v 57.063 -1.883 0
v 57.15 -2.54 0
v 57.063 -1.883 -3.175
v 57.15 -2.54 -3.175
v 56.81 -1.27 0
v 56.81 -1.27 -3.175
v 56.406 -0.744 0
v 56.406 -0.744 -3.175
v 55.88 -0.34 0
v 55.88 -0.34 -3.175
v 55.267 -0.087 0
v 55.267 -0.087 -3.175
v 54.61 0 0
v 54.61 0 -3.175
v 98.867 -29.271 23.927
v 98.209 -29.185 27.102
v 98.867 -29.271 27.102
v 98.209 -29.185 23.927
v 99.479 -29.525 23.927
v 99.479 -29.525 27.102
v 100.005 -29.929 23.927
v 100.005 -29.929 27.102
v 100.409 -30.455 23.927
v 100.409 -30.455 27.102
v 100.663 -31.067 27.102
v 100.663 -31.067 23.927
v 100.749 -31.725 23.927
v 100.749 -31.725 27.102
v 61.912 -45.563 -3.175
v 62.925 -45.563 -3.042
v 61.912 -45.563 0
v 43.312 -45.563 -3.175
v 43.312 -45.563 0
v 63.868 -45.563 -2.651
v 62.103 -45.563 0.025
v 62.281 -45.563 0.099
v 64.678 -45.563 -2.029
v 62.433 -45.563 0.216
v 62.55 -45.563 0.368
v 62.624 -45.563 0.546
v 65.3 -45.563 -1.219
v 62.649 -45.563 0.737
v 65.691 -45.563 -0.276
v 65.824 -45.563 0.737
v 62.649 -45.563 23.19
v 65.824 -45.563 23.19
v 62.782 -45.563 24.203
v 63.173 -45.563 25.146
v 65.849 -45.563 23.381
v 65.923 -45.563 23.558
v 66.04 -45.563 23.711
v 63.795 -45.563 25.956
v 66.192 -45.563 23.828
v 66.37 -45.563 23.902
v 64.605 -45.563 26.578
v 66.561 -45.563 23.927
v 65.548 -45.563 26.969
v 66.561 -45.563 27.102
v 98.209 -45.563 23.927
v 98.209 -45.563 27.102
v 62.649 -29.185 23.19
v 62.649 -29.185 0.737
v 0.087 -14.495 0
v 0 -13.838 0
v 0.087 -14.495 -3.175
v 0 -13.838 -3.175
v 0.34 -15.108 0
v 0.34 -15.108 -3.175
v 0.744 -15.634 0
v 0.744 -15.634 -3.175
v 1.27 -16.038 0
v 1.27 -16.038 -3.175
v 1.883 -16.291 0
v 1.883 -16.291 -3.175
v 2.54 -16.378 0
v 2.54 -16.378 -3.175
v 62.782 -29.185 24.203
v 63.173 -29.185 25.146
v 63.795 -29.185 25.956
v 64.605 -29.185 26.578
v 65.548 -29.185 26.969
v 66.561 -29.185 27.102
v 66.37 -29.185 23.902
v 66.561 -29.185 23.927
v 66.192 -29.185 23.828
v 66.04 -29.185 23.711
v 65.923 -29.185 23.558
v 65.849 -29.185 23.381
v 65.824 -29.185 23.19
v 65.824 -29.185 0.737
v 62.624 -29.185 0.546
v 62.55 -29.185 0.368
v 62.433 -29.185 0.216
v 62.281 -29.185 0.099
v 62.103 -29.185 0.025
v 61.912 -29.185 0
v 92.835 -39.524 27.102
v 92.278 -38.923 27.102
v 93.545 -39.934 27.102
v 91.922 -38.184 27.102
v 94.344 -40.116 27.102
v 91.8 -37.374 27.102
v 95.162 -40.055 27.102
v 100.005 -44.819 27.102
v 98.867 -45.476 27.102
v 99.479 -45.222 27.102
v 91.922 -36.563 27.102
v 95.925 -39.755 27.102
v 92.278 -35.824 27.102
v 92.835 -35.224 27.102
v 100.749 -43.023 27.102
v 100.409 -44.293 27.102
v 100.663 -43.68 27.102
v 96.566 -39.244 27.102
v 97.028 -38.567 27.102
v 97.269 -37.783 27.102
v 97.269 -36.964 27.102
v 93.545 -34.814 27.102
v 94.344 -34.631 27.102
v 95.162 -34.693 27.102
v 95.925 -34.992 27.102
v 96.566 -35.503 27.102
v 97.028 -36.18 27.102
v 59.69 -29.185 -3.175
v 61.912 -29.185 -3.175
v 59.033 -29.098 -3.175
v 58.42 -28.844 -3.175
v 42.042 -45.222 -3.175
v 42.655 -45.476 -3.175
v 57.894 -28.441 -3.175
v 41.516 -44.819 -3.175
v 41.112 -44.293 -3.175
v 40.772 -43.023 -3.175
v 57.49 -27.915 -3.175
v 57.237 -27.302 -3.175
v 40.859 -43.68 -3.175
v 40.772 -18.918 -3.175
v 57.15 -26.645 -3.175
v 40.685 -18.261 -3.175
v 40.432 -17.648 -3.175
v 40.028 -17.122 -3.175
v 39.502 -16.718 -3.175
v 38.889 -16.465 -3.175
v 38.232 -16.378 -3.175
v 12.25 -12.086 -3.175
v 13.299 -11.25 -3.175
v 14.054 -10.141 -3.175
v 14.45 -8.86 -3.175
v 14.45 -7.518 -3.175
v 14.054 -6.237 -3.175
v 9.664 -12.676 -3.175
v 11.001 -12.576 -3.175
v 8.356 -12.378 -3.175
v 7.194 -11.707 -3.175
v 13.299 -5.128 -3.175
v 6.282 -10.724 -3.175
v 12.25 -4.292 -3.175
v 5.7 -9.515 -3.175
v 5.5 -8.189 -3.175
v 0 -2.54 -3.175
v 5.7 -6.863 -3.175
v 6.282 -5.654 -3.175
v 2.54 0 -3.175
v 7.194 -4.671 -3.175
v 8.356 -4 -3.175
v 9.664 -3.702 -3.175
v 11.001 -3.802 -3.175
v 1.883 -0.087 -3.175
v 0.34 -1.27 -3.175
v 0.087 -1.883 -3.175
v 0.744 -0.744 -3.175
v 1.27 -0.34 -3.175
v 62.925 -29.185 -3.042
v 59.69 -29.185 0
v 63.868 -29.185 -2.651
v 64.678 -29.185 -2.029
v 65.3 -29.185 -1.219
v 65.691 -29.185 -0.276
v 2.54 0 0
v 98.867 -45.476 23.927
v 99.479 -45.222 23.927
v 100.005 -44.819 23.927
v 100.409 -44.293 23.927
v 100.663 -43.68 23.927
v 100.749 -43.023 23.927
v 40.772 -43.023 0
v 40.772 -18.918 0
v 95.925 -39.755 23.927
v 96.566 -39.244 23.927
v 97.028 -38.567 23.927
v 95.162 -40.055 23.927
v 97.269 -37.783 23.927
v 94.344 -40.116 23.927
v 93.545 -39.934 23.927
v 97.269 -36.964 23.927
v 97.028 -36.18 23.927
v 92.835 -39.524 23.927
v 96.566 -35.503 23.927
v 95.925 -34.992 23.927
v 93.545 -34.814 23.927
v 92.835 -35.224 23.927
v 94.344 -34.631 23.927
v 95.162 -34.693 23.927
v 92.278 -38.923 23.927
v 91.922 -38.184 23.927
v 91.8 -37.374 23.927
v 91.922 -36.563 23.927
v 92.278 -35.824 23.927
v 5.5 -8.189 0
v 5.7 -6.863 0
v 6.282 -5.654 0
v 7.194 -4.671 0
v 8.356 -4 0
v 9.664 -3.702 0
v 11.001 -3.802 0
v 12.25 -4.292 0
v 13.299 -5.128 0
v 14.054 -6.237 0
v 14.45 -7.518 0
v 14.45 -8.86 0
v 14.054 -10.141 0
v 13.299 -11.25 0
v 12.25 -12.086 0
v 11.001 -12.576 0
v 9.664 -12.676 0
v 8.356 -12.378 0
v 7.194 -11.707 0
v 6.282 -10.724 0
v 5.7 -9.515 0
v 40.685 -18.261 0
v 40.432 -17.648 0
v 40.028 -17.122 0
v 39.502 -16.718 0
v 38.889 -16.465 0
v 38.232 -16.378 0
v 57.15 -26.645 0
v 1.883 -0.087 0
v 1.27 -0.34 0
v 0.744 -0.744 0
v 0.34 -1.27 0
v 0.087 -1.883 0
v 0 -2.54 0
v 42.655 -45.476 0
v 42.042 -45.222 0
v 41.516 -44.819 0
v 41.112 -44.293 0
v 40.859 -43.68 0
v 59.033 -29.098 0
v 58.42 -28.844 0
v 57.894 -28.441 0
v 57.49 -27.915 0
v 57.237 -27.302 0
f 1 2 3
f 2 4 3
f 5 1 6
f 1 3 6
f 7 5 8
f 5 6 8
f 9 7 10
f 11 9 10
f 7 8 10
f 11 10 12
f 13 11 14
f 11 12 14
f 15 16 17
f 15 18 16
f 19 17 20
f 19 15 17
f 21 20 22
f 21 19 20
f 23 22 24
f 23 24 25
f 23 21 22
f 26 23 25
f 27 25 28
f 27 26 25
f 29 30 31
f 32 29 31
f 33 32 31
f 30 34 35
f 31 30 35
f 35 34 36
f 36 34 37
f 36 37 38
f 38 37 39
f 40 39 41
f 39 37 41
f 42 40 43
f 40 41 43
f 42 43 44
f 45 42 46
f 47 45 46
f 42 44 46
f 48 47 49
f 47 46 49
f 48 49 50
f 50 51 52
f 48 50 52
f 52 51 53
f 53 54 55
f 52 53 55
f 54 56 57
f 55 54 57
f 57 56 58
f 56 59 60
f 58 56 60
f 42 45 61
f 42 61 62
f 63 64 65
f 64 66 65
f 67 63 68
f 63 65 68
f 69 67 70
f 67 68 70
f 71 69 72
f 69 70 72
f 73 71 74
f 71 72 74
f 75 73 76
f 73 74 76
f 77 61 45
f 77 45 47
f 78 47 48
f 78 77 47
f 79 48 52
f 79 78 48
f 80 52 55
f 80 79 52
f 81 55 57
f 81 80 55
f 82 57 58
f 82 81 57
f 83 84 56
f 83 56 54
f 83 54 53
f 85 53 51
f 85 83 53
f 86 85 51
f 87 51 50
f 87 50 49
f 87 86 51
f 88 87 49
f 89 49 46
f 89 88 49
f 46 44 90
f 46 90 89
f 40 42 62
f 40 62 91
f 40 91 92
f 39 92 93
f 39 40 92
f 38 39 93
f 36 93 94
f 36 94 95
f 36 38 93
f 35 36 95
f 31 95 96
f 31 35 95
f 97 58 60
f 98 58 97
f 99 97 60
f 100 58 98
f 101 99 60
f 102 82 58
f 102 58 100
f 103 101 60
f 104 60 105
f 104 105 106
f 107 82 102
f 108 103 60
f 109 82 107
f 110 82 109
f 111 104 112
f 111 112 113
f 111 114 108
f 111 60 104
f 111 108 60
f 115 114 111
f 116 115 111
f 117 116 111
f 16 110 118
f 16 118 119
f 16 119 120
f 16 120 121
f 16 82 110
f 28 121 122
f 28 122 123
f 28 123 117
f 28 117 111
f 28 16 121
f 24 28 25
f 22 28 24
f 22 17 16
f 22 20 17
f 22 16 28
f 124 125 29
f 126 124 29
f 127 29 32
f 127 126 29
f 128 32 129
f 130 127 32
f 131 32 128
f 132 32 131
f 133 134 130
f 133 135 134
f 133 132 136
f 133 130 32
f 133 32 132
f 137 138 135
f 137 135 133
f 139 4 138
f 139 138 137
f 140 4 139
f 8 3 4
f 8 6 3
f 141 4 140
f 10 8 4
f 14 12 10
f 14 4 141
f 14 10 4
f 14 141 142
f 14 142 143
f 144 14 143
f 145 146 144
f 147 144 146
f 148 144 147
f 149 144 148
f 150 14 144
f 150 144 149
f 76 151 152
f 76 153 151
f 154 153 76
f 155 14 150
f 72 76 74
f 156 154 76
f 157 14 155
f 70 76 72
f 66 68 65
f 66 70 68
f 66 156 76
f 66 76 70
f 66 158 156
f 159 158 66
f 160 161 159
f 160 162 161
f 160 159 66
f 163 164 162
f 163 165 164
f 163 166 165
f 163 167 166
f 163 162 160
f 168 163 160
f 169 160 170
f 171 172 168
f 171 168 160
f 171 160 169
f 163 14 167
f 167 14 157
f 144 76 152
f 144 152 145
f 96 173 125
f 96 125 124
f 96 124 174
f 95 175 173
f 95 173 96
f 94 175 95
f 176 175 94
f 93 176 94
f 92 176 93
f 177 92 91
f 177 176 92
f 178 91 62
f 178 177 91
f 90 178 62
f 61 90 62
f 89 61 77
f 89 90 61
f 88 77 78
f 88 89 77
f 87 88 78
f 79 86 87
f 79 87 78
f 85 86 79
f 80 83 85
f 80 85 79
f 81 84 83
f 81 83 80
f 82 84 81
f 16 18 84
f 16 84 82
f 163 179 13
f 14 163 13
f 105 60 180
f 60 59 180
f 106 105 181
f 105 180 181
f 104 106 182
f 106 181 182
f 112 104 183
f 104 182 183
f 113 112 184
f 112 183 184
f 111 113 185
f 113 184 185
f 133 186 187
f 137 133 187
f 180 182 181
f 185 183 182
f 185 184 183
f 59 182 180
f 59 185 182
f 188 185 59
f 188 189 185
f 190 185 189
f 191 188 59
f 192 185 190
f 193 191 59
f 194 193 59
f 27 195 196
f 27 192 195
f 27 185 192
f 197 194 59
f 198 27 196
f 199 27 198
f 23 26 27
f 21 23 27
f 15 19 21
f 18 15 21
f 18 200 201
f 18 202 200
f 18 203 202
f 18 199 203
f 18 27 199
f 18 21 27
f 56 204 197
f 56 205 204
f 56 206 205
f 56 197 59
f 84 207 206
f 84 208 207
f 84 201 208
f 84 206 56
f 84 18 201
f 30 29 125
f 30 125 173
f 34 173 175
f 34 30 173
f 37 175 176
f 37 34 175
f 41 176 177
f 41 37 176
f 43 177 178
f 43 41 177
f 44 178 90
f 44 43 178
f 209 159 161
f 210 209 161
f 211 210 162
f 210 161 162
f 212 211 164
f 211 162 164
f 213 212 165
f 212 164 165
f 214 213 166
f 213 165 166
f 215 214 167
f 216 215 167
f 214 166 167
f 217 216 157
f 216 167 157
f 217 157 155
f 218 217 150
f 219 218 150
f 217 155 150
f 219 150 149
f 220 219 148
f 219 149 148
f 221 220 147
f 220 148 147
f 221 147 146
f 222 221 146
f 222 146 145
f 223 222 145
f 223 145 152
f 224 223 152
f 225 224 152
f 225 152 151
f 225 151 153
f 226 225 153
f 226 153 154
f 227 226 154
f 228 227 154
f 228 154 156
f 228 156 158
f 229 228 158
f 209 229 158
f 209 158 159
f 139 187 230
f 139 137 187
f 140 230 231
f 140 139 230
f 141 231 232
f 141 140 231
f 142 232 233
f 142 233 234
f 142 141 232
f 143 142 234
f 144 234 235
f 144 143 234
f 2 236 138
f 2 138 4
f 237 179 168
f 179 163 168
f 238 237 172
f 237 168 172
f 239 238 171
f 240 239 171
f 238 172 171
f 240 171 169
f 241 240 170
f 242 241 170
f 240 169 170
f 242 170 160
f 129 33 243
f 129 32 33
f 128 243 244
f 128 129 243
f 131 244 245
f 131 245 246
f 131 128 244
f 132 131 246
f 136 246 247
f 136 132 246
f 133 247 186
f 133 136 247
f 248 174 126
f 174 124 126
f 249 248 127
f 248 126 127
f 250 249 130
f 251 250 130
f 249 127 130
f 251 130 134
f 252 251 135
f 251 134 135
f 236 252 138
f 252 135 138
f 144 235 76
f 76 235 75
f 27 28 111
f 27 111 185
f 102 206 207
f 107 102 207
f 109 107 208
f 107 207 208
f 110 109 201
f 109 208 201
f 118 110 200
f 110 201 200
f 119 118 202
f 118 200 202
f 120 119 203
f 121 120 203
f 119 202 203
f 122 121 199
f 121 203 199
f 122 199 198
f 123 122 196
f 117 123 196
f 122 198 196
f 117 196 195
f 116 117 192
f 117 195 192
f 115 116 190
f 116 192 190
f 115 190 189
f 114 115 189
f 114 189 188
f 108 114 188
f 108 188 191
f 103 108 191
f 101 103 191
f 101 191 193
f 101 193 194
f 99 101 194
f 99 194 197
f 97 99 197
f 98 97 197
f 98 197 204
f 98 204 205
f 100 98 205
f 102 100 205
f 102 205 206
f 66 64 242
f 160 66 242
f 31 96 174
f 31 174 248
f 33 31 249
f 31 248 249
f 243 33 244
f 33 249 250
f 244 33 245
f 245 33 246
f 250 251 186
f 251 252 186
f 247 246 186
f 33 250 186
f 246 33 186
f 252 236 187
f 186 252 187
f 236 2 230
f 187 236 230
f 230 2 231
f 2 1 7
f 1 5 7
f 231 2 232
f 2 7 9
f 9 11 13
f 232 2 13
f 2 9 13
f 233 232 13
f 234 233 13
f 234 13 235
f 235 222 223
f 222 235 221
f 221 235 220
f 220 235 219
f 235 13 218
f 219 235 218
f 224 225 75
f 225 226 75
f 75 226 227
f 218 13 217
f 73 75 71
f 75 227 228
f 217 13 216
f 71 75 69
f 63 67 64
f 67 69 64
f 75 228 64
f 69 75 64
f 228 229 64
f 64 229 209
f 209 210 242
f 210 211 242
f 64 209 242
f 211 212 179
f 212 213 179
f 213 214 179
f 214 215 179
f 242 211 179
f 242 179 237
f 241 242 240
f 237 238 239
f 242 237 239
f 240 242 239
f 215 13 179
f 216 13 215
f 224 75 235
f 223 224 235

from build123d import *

# Parameters (mm, degrees)
BASE_FLANGE1_DEPTH           = 3.175
M8_CLEARANCE_HOLE1_D         = 9
EDGE_FLANGE1_DEPTH           = 16.378
EDGE_FLANGE2_STRIP_W         = 14.1732
EDGE_FLANGE2_STRIP_H         = 3.175
EDGE_FLANGE2_STRIP_CUT_DEPTH = 16.378
EDGE_FLANGE2_DEPTH           = 16.378
M5_CLEARANCE_HOLE1_D         = 5.5
FILLET1_R                    = 2.54


# Sheet-metal steps are written as plain solids
with BuildPart() as part:
    # Sketch1 → Base-Flange1 (new body)
    with BuildSketch(Plane.XY):
        Polygon((0, 0), (57.15, 0), (57.15, -16.378), (57.15, -29.184600001), (61.9125, -29.184600001), (61.9125, -45.562600001), (57.15, -45.562600001), (40.772, -45.562600001), (40.772, -16.378), (0, -16.378), align=None)
    extrude(amount=-BASE_FLANGE1_DEPTH)

    # M8 Clearance Hole1 (through all)
    with Locations(Plane.XY):
        with Locations((10, -8.189)):
            Hole(M8_CLEARANCE_HOLE1_D / 2)

    # Edge-Flange1 section (across the edge) → Edge-Flange1 (add)
    with BuildSketch(Plane(origin=(62.6491, -45.562600001, 0), x_dir=(-1, 0, 0), z_dir=(0, 1, 0))):
        with BuildLine():
            Line((-3.175, 0.7366), (-3.175, 23.9268))
            Line((-3.175, 23.9268), (0, 23.9268))
            Line((0, 23.9268), (0, 0.7366))
            ThreePointArc((0, 0.7366), (0.215745145, 0.215745145), (0.7366, 0))
            Line((0.7366, 0), (0.7366, -3.175))
            ThreePointArc((0.7366, -3.175), (-2.029318885, -2.029318885), (-3.175, 0.7366))
        make_face()
    extrude(amount=EDGE_FLANGE1_DEPTH)

    # Edge-Flange2 strip (across the edge) → Edge-Flange2 strip cut (cut)
    with BuildSketch(Plane(origin=(65.8241, -29.184600001, 23.9268), x_dir=(0, 0, -1), z_dir=(0, -1, 0))):
        with Locations((-6.35, -1.5875)):
            Rectangle(EDGE_FLANGE2_STRIP_W, EDGE_FLANGE2_STRIP_H)
    extrude(amount=EDGE_FLANGE2_STRIP_CUT_DEPTH, mode=Mode.SUBTRACT)

    # Edge-Flange2 section (across the edge) → Edge-Flange2 (add)
    with BuildSketch(Plane(origin=(65.8241, -29.184600001, 23.9268), x_dir=(0, 0, -1), z_dir=(0, -1, 0))):
        with BuildLine():
            Line((-3.175, 0.7366), (-3.175, 34.925))
            Line((-3.175, 34.925), (0, 34.925))
            Line((0, 34.925), (0, 0.7366))
            ThreePointArc((0, 0.7366), (0.215745145, 0.215745145), (0.7366, 0))
            Line((0.7366, 0), (0.7366, -3.175))
            ThreePointArc((0.7366, -3.175), (-2.029318885, -2.029318885), (-3.175, 0.7366))
        make_face()
    extrude(amount=EDGE_FLANGE2_DEPTH)

    # M5 Clearance Hole1 (through all)
    with Locations(Plane.XY.offset(27.1018)):
        with Locations((94.5499, -37.373600001)):
            Hole(M5_CLEARANCE_HOLE1_D / 2)

    # Fillet1
    fillet1_edges = [part.edges().sort_by_distance(p)[0] for p in [
        (0, 0, -1.5875),
        (57.15, 0, -1.5875),
        (57.15, -29.184600001, -1.5875),
        (40.772, -45.562600001, -1.5875),
        (40.772, -16.378, -1.5875),
        (0, -16.378, -1.5875),
        (100.7491, -29.184600001, 25.5143),
        (100.7491, -45.562600001, 25.5143),
    ]]
    fillet(fillet1_edges, radius=FILLET1_R)


solid = part.part
